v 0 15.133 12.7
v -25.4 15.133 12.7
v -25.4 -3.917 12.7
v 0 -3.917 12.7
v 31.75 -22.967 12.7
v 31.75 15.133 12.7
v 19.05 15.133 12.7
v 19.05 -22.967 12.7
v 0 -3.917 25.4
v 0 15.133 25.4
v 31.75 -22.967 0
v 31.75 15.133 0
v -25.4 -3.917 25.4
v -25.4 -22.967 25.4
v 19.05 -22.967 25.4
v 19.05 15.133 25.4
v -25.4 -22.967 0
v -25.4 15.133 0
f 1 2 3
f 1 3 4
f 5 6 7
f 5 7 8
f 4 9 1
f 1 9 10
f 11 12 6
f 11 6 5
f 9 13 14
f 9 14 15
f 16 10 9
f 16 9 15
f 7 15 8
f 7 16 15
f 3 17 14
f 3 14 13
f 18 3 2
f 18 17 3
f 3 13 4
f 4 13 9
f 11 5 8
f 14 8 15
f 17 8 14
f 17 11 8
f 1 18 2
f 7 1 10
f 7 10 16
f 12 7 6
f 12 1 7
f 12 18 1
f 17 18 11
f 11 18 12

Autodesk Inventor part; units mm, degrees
ref_plane "YZ Plane" through (0, 0, 0) normal (1, 0, 0) x (0, 1, 0)
ref_plane "XZ Plane" through (0, 0, 0) normal (0, 1, 0) x (-1, 0, 0)
ref_plane "XY Plane" through (0, 0, 0) normal (0, 0, 1) x (1, 0, 0)
sketch "Sketch1" plane through (0, 0, 0) normal (0, 0, 1) x (1, 0, 0)
  line L0 (-25.4, 15.1328) -> (31.75, 15.1328)
  line L1 (31.75, 15.1328) -> (31.75, -22.9672)
  line L2 (31.75, -22.9672) -> (-25.4, -22.9672)
  line L3 (-25.4, -22.9672) -> (-25.4, 15.1328)
  point P0 (0, 0)
  dimension "d0" = 57.15
  dimension "d1" = 38.1
extrude "Extrusion1" add sketch "Sketch1" along normal blind 25.4
sketch "Sketch2" plane through (0, 0, 25.4) normal (0, 0, 1) x (1, 0, 0)
  line L0 (-25.4, 15.1328) -> (-25.4, -22.9672) projected
  line L1 (31.75, 15.1328) -> (-25.4, 15.1328) projected
  line L2 (-25.4, -3.9172) -> (0, -3.9172)
  line L3 (0, -3.9172) -> (0, 15.1328)
  line L4 (0, 15.1328) -> (-25.4, 15.1328)
  line L5 (-25.4, 15.1328) -> (-25.4, -3.9172)
  point P0 (0, 0)
  dimension "d4" = 19.05
  dimension "d5" = 25.4
extrude "Extrusion2" cut sketch "Sketch2" against normal blind 12.7
sketch "Sketch3" plane through (31.75, -22.9672, 0) normal (1, 0, 0) x (0, 0, -1)
  line L0 (0, 0) -> (-25.4, 0) projected
  line L1 (0, 38.1) -> (-25.4, 38.1) projected
  line L2 (-12.7, 0) -> (-25.4, 0)
  line L3 (-25.4, 0) -> (-25.4, 38.1)
  line L4 (-25.4, 38.1) -> (-12.7, 38.1)
  line L5 (-12.7, 38.1) -> (-12.7, 0)
  point P0 (0, 22.9672)
  dimension "d8" = 12.7
extrude "Extrusion3" cut sketch "Sketch3" against normal blind 12.7
properties part number "Figure 7_27_3"
